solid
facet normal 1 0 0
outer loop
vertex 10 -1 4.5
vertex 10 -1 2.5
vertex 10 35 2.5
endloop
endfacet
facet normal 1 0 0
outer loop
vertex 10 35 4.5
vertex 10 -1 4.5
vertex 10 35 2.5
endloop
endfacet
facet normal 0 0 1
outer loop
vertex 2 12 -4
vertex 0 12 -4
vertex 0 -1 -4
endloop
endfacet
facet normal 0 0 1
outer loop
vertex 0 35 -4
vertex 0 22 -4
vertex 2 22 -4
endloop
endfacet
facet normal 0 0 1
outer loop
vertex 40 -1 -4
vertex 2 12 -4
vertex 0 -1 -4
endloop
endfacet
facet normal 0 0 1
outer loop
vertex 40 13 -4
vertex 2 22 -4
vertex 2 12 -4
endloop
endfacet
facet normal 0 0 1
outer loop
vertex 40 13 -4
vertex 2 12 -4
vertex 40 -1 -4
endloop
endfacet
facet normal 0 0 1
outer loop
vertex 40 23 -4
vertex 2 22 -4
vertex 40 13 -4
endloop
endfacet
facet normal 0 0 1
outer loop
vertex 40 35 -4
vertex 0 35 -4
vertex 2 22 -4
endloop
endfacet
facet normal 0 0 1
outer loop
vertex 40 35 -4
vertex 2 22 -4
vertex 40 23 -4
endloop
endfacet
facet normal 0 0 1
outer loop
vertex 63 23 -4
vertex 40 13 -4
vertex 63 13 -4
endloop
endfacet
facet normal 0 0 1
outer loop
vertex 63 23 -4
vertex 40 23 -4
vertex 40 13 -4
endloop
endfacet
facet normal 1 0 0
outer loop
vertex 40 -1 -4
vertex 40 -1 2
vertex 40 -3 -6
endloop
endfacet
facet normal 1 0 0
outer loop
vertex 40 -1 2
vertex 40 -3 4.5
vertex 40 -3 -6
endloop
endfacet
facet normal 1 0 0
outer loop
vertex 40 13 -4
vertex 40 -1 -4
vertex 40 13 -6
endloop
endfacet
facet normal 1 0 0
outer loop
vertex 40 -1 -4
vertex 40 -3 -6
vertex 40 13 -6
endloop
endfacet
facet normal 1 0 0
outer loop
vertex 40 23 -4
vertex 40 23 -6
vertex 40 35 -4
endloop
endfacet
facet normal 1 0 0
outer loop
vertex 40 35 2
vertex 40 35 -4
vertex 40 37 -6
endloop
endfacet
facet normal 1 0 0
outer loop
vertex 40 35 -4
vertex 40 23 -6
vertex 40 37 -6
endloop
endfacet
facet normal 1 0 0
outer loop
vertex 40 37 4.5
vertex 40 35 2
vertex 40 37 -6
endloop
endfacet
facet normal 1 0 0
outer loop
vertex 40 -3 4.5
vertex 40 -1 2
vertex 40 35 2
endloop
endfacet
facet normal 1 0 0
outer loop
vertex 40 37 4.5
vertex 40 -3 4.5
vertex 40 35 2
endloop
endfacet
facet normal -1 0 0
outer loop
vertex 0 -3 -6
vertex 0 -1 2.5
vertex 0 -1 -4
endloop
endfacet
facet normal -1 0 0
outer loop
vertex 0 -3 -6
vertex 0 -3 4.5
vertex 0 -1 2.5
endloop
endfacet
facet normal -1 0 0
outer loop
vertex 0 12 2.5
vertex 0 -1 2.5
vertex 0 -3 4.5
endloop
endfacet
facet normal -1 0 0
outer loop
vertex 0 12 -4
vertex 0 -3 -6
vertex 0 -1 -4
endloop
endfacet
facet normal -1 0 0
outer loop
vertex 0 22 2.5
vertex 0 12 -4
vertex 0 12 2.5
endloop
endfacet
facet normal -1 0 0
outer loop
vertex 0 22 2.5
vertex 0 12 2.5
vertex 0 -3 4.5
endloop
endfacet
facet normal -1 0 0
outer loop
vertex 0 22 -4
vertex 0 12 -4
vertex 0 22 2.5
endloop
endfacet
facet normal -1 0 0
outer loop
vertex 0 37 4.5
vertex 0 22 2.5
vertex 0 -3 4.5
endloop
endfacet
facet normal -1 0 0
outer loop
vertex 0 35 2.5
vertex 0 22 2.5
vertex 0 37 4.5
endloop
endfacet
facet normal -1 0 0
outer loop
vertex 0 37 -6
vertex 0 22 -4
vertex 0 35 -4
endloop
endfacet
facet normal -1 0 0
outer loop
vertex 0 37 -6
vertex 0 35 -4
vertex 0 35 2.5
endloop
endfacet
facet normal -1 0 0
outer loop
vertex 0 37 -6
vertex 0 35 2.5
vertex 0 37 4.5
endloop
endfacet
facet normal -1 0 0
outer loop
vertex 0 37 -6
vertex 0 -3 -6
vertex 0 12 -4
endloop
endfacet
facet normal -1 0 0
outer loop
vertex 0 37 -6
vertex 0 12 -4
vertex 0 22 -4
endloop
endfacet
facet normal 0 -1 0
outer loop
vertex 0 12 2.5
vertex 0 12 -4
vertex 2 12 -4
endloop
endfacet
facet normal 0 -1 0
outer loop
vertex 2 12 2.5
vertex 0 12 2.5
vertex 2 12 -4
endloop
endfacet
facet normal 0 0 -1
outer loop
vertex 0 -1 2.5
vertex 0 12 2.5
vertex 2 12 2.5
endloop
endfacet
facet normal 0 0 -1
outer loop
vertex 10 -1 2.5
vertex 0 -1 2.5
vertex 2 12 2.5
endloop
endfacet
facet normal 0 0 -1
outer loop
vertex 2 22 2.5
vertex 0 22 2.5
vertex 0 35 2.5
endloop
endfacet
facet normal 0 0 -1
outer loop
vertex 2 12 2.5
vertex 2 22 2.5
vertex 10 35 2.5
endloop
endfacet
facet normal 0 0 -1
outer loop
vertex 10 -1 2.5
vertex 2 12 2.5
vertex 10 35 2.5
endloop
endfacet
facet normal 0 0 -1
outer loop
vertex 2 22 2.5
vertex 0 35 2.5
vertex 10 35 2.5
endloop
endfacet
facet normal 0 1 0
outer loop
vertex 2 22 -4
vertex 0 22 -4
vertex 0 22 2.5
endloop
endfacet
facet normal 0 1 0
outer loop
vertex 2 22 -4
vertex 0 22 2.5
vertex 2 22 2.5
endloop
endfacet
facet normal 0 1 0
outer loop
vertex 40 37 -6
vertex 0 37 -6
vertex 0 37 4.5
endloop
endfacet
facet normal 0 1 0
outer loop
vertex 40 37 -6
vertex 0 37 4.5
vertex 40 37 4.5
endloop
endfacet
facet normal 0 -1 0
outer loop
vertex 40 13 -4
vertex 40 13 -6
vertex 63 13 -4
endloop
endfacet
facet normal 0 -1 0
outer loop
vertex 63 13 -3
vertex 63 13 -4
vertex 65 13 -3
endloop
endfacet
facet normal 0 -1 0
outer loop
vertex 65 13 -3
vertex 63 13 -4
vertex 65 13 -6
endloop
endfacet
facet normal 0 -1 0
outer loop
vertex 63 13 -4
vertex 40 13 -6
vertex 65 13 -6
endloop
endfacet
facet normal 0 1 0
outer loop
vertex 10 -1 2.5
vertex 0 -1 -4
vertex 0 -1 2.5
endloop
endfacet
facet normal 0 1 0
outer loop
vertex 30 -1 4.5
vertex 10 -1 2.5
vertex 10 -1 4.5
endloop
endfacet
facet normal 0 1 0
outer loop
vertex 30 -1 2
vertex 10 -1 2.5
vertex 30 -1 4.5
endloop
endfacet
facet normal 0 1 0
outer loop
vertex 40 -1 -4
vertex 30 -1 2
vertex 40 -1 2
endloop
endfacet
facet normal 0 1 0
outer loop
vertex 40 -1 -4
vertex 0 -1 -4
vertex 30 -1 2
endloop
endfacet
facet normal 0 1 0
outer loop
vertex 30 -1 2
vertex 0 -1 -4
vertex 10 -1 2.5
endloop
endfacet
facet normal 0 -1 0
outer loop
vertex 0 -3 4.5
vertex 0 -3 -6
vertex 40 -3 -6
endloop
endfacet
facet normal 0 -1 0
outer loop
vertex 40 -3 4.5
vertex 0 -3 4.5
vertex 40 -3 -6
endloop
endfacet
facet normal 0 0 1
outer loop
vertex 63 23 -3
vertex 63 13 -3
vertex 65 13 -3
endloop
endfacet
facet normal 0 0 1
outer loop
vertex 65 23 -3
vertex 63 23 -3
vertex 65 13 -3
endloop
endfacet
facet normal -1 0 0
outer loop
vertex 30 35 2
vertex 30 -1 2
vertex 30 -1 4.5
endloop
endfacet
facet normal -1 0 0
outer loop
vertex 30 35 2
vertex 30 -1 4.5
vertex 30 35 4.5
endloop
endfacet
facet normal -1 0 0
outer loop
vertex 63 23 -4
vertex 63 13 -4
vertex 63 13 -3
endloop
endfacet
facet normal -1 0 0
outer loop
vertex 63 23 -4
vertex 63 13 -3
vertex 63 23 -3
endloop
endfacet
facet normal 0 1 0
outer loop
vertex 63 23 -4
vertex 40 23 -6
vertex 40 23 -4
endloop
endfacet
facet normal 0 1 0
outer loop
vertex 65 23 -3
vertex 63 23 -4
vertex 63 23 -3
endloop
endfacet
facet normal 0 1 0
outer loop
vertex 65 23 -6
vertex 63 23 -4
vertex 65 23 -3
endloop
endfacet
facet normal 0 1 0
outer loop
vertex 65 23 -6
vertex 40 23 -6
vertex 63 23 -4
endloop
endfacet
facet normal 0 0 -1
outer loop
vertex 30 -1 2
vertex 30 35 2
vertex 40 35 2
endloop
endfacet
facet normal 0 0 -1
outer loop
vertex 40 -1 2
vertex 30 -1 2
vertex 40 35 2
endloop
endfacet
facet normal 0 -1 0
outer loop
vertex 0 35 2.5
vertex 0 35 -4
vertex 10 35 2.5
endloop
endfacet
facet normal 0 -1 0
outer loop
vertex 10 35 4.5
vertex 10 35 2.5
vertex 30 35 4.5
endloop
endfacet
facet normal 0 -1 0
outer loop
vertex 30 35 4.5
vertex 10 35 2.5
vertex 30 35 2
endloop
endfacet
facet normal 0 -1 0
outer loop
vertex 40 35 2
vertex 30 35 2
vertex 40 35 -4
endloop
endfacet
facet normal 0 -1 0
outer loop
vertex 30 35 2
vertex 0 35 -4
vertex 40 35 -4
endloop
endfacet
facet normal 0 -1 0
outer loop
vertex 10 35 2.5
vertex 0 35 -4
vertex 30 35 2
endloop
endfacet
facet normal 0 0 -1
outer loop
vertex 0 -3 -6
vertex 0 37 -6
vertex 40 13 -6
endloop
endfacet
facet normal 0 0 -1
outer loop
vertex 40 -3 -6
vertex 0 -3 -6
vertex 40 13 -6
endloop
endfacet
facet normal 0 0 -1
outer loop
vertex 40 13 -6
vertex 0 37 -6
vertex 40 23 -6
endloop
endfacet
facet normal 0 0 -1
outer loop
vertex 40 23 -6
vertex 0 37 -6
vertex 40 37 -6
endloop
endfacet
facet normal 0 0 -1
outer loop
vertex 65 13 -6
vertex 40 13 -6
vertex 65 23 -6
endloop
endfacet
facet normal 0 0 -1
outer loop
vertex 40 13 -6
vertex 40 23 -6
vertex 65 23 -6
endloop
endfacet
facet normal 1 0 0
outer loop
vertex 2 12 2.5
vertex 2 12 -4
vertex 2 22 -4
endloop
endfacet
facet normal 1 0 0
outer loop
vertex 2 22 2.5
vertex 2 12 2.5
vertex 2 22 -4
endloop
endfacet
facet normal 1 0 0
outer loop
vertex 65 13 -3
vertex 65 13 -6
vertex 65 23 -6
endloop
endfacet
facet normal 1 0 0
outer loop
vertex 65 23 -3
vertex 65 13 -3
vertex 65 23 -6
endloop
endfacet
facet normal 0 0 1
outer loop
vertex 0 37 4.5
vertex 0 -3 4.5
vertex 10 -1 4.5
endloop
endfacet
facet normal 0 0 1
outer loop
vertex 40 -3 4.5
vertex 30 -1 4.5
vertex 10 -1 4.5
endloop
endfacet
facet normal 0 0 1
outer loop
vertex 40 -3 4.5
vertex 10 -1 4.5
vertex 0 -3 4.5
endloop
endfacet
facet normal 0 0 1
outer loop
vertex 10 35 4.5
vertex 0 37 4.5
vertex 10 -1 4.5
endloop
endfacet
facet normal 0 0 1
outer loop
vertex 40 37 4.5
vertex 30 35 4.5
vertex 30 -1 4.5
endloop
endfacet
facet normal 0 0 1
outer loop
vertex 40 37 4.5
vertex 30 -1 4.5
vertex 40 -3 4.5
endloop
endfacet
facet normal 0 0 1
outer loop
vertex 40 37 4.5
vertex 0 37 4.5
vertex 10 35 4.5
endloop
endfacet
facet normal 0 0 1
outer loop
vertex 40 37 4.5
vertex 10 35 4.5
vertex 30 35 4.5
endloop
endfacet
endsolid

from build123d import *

# Parameters (mm, degrees)
BOX001_W     = 40
BOX001_H     = 36
BOX001_DEPTH = 2
BOX002_W     = 10
BOX002_H     = 38
BOX002_DEPTH = 2.5
BOX003_W     = 40
BOX003_H     = 2
BOX003_DEPTH = 10.5
BOX004_W     = 40
BOX004_H     = 2
BOX004_DEPTH = 10.5
BOX005_W     = 2
BOX005_H     = 10
BOX005_DEPTH = 8.5
BOX006_W     = 63
BOX006_H     = 10
BOX006_DEPTH = 2
BOX007_W     = 2
BOX007_H     = 10
BOX007_DEPTH = 2
BOX_W        = 10
BOX_H        = 38
BOX_DEPTH    = 2


with BuildPart() as cube001:
    # Box001 → Box001 (new body)
    with BuildSketch(Plane(origin=(0, -1, -6), x_dir=(1, 0, 0), z_dir=(0, 0, 1))):
        with Locations((20, 18)):
            Rectangle(BOX001_W, BOX001_H)
    extrude(amount=BOX001_DEPTH)


with BuildPart() as cube002:
    # Box002 → Box002 (new body)
    with BuildSketch(Plane(origin=(30, -2, 2), x_dir=(1, 0, 0), z_dir=(0, 0, 1))):
        with Locations((5, 19)):
            Rectangle(BOX002_W, BOX002_H)
    extrude(amount=BOX002_DEPTH)


with BuildPart() as cube003:
    # Box003 → Box003 (new body)
    with BuildSketch(Plane(origin=(0, -3, -6), x_dir=(1, 0, 0), z_dir=(0, 0, 1))):
        with Locations((20, 1)):
            Rectangle(BOX003_W, BOX003_H)
    extrude(amount=BOX003_DEPTH)


with BuildPart() as cube004:
    # Box004 → Box004 (new body)
    with BuildSketch(Plane(origin=(0, 35, -6), x_dir=(1, 0, 0), z_dir=(0, 0, 1))):
        with Locations((20, 1)):
            Rectangle(BOX004_W, BOX004_H)
    extrude(amount=BOX004_DEPTH)


with BuildPart() as cube005:
    # Box005 → Box005 (new body)
    with BuildSketch(Plane(origin=(0, 12, -4), x_dir=(1, 0, 0), z_dir=(0, 0, 1))):
        with Locations((1, 5)):
            Rectangle(BOX005_W, BOX005_H)
    extrude(amount=BOX005_DEPTH)


with BuildPart() as cube006:
    # Box006 → Box006 (new body)
    with BuildSketch(Plane(origin=(2, 13, -6), x_dir=(1, 0, 0), z_dir=(0, 0, 1))):
        with Locations((31.5, 5)):
            Rectangle(BOX006_W, BOX006_H)
    extrude(amount=BOX006_DEPTH)


with BuildPart() as cube007:
    # Box007 → Box007 (new body)
    with BuildSketch(Plane(origin=(63, 13, -5), x_dir=(1, 0, 0), z_dir=(0, 0, 1))):
        with Locations((1, 5)):
            Rectangle(BOX007_W, BOX007_H)
    extrude(amount=BOX007_DEPTH)


with BuildPart() as fusion:
    # Box → Box (new body)
    with BuildSketch(Plane(origin=(0, -2, 2.5), x_dir=(1, 0, 0), z_dir=(0, 0, 1))):
        with Locations((5, 19)):
            Rectangle(BOX_W, BOX_H)
    extrude(amount=BOX_DEPTH)

    # Fusion: union Cube001, Cube002, Cube003, Cube004, Cube005, Cube006, Cube007
    add(cube001.part)
    add(cube002.part)
    add(cube003.part)
    add(cube004.part)
    add(cube005.part)
    add(cube006.part)
    add(cube007.part)


solid = fusion.part
